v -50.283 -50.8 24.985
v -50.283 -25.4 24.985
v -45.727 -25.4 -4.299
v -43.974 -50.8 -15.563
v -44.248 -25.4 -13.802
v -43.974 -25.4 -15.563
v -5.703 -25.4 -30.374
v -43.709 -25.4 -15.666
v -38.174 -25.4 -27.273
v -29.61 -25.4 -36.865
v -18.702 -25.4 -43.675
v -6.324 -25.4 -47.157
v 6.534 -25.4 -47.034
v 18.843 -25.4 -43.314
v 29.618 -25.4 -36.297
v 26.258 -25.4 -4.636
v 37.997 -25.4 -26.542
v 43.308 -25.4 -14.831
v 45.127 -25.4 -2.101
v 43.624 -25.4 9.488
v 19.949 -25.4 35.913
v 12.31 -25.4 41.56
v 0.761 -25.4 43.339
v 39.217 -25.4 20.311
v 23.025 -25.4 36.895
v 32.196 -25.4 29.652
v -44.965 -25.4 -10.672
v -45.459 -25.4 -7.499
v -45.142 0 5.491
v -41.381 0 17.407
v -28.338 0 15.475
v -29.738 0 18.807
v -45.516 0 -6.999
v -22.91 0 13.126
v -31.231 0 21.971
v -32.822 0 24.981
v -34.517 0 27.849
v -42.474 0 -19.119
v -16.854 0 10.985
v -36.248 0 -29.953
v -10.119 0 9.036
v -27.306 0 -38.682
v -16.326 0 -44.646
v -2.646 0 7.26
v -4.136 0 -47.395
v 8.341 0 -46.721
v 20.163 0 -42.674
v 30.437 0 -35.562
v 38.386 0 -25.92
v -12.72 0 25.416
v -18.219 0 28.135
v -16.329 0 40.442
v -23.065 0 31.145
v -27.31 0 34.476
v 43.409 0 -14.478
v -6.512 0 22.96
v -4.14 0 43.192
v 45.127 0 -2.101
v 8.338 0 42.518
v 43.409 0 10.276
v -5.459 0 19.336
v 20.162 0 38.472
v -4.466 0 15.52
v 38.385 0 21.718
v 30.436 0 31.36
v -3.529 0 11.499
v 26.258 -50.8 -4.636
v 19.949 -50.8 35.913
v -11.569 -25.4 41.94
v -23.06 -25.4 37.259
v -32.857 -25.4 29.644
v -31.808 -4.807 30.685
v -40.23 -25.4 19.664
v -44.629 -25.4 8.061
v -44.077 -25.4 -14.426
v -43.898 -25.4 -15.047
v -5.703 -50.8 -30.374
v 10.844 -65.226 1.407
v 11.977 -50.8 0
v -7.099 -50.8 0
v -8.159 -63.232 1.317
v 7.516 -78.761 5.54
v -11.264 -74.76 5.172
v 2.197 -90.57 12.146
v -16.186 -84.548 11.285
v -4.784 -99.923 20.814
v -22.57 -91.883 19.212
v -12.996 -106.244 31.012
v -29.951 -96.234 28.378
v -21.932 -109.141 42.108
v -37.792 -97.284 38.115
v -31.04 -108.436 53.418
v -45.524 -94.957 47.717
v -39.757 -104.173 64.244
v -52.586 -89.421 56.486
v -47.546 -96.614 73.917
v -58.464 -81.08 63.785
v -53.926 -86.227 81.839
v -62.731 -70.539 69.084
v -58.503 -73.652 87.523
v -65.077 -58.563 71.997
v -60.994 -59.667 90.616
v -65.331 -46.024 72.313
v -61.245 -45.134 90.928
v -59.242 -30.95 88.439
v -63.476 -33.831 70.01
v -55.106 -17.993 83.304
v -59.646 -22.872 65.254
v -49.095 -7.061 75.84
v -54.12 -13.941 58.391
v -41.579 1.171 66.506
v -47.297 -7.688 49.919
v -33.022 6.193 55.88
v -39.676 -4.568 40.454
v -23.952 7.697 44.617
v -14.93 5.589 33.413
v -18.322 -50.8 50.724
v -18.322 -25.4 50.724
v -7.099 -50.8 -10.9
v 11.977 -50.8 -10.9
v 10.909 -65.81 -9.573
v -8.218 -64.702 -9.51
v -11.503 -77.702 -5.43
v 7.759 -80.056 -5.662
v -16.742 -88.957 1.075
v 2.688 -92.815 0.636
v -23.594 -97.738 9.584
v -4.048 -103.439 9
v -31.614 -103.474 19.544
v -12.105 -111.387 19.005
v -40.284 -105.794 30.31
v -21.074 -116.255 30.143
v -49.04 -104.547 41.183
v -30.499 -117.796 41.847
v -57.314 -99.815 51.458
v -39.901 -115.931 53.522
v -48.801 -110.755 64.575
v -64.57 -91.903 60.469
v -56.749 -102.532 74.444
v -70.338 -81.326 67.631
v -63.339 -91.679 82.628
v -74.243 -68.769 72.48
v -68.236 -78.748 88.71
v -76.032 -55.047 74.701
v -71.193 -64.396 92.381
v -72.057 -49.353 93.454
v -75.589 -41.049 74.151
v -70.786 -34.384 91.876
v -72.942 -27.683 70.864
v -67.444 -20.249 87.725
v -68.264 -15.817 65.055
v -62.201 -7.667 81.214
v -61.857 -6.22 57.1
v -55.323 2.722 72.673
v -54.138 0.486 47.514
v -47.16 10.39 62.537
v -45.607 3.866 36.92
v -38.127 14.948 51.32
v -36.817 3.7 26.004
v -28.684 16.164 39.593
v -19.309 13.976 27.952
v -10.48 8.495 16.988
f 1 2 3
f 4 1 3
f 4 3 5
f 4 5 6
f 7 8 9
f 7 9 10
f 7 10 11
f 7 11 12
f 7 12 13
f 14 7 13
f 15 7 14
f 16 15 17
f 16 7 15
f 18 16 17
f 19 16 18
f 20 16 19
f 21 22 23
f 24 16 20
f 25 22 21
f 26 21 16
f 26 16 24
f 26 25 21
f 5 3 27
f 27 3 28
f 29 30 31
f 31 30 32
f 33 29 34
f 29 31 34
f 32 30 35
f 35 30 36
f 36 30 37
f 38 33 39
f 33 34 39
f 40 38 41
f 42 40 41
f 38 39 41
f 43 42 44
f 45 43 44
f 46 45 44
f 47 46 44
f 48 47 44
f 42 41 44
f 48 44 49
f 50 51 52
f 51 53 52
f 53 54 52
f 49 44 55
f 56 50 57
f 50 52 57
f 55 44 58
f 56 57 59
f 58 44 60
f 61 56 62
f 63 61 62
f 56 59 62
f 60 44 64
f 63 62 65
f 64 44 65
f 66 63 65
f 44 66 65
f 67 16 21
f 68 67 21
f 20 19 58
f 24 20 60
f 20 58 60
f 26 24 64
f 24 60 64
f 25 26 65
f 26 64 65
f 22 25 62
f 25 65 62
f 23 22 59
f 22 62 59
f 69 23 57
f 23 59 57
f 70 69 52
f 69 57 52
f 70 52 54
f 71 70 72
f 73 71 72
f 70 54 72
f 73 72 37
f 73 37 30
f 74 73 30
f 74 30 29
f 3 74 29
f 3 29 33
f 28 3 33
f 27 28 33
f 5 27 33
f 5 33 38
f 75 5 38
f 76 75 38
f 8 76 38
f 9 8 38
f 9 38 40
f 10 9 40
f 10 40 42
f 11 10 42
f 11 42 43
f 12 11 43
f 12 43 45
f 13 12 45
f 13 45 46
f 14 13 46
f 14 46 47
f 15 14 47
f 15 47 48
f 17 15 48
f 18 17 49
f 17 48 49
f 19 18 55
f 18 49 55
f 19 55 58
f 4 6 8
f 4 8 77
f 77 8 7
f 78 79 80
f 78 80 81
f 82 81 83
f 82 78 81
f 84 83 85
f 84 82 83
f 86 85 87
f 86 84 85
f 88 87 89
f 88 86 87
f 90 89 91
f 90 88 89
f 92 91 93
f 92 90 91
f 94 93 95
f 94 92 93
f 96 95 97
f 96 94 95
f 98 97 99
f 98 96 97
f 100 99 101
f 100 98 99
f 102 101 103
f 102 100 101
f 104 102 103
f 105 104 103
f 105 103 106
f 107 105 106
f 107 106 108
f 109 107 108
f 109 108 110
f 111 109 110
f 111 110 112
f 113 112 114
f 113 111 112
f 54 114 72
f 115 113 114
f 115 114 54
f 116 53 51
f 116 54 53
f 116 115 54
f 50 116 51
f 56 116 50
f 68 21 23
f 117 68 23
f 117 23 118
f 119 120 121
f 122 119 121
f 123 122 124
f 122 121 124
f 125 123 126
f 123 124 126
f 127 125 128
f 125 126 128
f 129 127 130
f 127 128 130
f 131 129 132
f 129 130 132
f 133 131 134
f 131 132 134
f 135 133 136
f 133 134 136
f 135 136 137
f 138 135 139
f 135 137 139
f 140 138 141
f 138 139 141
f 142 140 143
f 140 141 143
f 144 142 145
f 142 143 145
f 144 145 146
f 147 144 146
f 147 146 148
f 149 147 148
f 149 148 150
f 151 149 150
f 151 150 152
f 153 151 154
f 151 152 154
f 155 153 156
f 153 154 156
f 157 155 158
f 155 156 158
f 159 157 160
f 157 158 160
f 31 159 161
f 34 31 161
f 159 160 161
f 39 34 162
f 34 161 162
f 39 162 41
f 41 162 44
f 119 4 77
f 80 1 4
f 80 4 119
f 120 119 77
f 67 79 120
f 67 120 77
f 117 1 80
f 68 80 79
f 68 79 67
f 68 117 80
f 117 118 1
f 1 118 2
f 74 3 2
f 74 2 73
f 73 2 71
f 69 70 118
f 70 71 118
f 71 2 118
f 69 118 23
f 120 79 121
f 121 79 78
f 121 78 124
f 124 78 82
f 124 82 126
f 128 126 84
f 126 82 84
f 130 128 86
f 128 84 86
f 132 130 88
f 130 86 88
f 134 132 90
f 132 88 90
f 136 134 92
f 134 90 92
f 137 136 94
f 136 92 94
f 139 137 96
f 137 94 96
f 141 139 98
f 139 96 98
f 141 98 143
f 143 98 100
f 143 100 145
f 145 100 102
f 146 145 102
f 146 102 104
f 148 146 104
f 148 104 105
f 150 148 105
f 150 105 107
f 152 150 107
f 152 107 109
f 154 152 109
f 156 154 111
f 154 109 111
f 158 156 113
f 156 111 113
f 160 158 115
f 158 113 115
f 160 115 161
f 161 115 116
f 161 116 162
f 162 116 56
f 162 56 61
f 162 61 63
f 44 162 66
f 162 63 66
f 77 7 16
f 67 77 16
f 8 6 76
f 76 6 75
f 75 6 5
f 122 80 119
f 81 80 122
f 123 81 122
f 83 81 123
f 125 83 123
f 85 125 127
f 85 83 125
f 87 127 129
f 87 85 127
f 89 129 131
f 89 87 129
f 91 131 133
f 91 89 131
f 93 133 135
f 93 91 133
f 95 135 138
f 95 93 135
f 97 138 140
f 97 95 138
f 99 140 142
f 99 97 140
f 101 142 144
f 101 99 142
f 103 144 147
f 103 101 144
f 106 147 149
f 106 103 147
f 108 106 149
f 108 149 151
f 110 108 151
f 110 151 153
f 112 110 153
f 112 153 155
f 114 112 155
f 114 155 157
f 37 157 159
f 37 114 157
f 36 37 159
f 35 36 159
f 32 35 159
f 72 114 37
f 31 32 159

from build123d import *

# Parameters (mm, degrees)
F0_R     = 45.453378
F1_DEPTH = 25.4
F3_DEPTH = 25.4
F4_W     = 19.075925
F4_H     = 10.899786


with BuildPart() as f1:
    # F0 (on Front) → F1 (new body)
    with BuildSketch(Plane.XZ):
        with Locations((-0.326774, -2.101401)):
            Circle(F0_R)
    extrude(amount=F1_DEPTH)

    # F2 (on face) → F3 (join)
    with BuildSketch(Plane.XZ.offset(25.4)):
        Polygon((26.258245, -4.635622), (19.949142, 35.913156), (-18.321682, 50.723701), (-50.283402, 24.985468), (-43.974299, -15.563311), (-5.703475, -30.373856), align=None)
    extrude(amount=F3_DEPTH)

    # F4 (on face) → F5 (revolve)
    with BuildSketch(Plane.XZ.offset(50.8)):
        with Locations((2.4393, -5.449893)):
            Rectangle(F4_W, F4_H)
    revolve(axis=Axis((-34.302542, -50.8, 37.854584), (-0.778858, 0, -0.627201)))


solid = f1.part
